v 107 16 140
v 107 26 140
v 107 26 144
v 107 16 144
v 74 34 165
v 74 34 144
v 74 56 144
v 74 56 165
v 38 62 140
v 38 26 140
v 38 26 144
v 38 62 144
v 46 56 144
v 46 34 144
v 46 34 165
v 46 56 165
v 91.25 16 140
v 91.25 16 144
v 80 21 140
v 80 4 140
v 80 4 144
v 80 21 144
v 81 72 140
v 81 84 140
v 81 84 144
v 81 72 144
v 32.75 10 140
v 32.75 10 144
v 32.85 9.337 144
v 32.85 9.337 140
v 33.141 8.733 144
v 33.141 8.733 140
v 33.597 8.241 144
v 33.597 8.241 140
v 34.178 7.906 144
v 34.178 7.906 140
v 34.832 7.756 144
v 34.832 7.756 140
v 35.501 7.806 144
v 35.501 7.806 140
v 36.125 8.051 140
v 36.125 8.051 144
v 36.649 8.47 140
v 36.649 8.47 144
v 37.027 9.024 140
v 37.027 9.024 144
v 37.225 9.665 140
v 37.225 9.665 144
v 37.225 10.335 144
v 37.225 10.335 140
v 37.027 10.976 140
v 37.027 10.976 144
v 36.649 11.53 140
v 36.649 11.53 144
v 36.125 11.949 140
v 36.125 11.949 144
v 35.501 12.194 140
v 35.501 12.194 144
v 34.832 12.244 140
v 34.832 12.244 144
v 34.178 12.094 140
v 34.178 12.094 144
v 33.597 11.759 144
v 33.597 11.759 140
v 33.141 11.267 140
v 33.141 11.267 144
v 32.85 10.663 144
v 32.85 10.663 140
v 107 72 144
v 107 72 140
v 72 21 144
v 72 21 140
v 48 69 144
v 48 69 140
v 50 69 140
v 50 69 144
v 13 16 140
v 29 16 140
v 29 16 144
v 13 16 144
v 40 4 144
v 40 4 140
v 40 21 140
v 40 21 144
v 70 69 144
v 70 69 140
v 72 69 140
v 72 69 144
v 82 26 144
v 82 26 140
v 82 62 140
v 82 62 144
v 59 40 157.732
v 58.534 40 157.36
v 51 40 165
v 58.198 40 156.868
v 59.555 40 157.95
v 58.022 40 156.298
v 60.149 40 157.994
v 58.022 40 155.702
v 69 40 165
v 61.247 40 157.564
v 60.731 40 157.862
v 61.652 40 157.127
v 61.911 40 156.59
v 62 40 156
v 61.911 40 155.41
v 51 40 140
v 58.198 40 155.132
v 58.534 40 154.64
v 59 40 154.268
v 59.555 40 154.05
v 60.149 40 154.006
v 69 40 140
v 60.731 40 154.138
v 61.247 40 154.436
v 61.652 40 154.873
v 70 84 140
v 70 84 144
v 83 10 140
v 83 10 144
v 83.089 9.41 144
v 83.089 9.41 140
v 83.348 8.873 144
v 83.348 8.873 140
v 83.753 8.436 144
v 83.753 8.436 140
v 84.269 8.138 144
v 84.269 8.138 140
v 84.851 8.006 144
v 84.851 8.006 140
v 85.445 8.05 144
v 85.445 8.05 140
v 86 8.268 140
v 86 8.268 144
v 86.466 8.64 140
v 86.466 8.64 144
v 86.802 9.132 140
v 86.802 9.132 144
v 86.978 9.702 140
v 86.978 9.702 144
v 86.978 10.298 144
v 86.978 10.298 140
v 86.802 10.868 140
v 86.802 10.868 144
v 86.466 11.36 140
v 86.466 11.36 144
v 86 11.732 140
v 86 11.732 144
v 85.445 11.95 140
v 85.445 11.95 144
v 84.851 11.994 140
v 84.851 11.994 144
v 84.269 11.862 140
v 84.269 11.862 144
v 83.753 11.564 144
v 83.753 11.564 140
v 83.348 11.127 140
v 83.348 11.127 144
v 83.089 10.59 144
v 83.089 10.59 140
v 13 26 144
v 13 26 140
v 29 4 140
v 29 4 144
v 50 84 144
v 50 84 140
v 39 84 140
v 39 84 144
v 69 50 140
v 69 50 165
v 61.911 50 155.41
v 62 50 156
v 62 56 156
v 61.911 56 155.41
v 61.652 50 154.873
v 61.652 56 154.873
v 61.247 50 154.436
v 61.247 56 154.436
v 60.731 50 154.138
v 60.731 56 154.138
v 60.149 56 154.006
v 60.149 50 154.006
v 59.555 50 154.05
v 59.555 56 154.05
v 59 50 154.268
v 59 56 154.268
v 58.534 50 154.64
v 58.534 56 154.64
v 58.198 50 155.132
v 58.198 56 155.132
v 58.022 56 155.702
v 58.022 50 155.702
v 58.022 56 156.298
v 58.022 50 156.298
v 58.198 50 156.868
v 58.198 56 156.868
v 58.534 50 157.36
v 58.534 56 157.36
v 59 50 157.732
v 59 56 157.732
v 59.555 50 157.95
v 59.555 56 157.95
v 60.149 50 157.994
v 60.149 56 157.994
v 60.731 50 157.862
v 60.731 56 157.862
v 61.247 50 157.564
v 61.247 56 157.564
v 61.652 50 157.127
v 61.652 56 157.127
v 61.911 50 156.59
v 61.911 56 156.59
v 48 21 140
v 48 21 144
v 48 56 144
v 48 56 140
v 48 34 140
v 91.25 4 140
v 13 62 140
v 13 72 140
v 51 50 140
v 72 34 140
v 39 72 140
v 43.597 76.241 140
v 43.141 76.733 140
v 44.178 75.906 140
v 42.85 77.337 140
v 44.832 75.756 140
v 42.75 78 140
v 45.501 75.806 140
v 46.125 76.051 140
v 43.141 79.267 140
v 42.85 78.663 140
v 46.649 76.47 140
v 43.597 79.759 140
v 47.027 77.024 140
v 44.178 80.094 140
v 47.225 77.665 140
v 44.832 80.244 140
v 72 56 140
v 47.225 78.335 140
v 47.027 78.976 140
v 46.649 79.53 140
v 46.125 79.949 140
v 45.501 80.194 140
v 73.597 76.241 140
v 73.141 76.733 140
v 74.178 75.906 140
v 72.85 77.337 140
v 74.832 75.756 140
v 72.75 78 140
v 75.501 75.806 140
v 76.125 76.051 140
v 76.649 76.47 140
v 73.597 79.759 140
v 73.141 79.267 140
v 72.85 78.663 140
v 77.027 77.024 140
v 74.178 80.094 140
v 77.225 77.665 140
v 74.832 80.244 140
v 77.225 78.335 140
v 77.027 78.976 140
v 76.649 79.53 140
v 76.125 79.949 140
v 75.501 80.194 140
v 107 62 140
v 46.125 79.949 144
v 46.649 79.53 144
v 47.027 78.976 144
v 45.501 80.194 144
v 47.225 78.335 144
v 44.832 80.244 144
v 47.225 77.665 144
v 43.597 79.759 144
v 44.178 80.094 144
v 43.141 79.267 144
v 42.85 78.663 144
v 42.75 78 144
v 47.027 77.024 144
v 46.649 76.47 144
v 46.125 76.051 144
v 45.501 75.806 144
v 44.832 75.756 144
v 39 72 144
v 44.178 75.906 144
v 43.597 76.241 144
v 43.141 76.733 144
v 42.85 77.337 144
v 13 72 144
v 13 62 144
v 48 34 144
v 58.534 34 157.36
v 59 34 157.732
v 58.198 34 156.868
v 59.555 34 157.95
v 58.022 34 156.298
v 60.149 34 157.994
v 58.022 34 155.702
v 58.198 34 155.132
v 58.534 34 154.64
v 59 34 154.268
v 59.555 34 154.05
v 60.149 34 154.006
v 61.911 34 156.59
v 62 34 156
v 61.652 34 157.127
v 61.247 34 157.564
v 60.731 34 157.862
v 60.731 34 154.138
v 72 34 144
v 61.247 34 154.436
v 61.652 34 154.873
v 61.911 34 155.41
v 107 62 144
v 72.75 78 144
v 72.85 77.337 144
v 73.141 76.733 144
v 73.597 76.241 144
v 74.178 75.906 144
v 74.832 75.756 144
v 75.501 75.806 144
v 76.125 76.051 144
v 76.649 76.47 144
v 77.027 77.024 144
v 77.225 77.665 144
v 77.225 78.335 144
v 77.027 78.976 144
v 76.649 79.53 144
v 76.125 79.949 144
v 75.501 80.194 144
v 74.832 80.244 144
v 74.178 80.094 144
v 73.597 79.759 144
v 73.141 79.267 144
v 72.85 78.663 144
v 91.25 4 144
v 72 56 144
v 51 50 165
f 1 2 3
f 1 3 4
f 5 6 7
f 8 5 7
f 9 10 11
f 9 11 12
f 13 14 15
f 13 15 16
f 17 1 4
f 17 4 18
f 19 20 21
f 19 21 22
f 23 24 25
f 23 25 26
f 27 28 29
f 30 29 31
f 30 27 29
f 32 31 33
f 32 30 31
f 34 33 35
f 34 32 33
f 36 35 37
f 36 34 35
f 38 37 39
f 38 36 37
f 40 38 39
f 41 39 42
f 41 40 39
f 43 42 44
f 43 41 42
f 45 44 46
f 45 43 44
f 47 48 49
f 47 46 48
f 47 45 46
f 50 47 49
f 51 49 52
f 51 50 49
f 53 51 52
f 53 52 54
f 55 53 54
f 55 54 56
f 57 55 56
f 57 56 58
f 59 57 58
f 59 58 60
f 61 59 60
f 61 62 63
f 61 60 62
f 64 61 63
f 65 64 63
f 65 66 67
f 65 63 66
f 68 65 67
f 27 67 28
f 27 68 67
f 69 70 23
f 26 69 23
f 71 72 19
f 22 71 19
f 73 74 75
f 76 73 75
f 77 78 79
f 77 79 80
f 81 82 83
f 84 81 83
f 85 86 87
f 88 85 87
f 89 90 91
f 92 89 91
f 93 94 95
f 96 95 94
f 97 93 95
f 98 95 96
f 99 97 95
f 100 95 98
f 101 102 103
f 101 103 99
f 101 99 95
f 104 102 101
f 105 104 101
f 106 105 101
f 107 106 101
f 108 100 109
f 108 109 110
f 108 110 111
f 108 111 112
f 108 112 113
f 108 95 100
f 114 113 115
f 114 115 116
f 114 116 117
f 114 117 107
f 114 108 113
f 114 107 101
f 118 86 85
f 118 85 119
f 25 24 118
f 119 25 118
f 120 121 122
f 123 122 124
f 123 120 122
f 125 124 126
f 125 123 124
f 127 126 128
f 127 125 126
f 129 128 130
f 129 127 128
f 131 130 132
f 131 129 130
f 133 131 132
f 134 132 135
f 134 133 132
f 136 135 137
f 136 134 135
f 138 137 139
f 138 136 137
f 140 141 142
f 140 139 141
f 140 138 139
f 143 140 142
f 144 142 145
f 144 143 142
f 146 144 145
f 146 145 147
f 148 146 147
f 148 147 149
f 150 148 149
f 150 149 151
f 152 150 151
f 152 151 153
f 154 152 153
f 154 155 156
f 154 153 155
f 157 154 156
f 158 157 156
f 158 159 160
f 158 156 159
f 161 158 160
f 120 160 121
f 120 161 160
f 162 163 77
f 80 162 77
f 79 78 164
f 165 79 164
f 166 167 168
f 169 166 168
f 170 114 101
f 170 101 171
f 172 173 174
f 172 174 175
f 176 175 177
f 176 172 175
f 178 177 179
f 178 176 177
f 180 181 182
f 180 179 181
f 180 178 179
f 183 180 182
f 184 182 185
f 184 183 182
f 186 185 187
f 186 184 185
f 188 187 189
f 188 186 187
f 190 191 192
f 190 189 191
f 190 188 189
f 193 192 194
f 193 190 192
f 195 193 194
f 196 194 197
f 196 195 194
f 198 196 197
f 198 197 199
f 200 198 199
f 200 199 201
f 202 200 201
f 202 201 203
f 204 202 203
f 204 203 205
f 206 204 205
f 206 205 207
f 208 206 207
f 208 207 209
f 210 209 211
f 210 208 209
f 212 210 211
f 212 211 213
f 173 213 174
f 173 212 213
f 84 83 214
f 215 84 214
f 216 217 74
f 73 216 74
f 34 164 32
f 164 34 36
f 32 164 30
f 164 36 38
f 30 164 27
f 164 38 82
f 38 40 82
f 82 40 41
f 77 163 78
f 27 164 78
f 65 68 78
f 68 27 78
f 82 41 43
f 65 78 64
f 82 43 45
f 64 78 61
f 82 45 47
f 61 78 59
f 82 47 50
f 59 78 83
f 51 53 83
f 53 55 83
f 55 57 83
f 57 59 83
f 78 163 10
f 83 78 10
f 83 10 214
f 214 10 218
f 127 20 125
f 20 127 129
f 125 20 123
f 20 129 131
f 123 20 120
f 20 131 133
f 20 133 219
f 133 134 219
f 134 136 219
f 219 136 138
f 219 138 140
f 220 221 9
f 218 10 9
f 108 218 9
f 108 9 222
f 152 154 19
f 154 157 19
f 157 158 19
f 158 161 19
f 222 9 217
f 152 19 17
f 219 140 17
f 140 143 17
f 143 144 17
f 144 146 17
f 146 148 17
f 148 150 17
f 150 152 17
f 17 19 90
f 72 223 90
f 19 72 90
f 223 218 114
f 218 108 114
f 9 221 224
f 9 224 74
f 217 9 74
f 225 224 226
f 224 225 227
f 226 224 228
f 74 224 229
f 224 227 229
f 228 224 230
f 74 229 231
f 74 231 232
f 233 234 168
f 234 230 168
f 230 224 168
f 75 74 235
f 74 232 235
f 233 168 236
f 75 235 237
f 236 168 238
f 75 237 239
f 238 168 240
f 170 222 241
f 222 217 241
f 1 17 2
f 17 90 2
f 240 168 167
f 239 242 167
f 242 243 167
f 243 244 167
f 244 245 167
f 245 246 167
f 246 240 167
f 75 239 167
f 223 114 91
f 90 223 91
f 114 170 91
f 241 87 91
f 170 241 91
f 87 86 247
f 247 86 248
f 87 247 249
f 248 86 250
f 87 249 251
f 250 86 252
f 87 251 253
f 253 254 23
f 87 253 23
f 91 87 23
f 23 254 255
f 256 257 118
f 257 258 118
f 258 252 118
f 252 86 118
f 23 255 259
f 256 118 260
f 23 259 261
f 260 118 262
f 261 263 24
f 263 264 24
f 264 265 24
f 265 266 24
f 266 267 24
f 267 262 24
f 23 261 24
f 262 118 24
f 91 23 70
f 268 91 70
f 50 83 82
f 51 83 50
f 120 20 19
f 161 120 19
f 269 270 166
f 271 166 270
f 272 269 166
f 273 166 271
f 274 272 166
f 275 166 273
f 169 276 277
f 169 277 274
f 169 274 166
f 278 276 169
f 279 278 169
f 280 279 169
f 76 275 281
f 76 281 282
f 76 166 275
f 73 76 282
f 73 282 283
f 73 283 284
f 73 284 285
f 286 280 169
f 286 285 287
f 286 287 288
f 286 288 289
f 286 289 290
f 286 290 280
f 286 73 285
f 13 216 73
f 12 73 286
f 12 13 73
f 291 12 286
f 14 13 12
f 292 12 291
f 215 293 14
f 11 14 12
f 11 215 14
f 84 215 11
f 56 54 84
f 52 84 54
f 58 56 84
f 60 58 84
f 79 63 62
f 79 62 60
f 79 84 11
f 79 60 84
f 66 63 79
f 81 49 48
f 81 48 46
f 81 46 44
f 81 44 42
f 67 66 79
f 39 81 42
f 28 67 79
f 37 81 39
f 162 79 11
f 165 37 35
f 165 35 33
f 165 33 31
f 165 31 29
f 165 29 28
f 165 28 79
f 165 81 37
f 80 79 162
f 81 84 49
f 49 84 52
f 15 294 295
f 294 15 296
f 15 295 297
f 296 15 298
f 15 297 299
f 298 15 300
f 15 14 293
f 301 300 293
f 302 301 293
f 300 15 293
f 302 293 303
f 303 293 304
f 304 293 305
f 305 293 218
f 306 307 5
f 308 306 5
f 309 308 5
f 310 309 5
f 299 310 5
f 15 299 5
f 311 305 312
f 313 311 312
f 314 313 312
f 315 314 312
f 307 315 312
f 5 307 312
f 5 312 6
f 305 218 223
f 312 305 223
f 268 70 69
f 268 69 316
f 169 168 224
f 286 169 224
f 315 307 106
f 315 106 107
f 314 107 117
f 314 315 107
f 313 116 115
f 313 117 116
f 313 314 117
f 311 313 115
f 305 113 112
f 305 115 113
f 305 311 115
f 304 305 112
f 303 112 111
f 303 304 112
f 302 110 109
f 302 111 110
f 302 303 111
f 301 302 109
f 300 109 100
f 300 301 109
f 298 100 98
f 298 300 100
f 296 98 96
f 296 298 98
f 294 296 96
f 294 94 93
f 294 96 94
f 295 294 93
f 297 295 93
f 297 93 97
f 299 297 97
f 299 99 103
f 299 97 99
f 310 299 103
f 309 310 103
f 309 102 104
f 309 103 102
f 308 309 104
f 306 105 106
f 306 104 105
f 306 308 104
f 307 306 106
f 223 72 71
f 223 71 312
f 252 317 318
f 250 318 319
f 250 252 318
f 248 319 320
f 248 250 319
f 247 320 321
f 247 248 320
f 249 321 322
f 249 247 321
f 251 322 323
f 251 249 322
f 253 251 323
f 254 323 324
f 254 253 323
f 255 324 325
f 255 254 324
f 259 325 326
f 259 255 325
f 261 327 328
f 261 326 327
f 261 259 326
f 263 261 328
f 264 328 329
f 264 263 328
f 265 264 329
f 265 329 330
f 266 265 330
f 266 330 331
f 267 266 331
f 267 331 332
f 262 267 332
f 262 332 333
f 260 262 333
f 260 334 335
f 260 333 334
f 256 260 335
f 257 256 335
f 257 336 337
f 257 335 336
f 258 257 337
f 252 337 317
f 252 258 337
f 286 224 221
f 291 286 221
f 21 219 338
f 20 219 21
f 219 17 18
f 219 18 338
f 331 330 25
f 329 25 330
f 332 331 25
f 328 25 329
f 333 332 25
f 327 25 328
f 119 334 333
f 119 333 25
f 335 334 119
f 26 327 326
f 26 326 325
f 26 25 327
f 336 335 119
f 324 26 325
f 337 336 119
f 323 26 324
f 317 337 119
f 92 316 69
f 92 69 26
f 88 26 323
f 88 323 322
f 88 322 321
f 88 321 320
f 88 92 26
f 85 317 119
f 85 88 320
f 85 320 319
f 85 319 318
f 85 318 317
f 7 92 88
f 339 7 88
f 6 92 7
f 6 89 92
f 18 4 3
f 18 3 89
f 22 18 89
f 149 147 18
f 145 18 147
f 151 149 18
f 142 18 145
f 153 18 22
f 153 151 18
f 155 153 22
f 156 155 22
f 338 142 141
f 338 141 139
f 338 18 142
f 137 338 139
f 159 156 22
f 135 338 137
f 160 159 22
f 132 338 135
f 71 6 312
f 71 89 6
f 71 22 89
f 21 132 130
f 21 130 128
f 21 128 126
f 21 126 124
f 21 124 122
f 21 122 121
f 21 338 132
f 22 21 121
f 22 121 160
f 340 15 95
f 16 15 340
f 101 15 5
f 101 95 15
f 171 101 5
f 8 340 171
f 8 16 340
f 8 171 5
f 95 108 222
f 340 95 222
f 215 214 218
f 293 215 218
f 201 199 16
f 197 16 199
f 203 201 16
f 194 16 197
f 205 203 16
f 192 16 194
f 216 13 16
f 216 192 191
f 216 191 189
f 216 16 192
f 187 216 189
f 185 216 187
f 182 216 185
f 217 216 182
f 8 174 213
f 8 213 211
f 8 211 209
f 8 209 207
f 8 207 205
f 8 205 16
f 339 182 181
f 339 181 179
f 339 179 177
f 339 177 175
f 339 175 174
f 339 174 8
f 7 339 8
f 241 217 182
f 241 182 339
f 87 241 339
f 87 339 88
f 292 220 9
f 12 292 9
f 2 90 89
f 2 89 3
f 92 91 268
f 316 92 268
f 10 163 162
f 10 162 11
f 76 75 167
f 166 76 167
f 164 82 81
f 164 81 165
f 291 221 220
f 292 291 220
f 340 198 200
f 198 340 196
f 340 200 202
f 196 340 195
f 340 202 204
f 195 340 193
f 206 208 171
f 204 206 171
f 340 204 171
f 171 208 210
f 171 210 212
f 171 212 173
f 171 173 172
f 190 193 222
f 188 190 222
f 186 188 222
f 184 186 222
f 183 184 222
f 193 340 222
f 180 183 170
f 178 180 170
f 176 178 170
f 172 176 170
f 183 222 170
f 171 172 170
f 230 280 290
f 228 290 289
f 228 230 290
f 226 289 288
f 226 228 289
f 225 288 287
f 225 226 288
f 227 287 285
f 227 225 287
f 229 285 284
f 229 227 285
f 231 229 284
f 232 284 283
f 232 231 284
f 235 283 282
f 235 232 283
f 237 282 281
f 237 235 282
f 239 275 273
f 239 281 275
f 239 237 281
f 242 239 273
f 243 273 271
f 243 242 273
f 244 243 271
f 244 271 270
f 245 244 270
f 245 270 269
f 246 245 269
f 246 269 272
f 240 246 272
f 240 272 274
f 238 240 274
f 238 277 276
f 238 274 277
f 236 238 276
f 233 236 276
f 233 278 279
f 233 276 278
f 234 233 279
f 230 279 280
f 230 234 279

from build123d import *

# Parameters (mm, degrees)
CYLINDER_R             = 2
CYLINDER_DEPTH         = 50
BOX083_W               = 24
BOX083_H               = 13
BOX083_DEPTH           = 10
BOX082_W               = 40
BOX082_H               = 17
BOX082_DEPTH           = 10
BOX081_W               = 25
BOX081_H               = 36
BOX081_DEPTH           = 10
BOX084_W               = 24
BOX084_H               = 13
BOX084_DEPTH           = 10
BOX080_W               = 25
BOX080_H               = 36
BOX080_DEPTH           = 10
BOX085_W               = 15
BOX085_H               = 20
BOX085_DEPTH           = 10
BOX073_W               = 18
BOX073_H               = 10
BOX073_DEPTH           = 25
BOX086_W               = 28
BOX086_H               = 22
BOX086_DEPTH           = 25
CYLINDER107_R          = 1
CYLINDER107_DEPTH      = 10
CYLINDER103_R          = 2.25
CYLINDER103_DEPTH      = 10
CYLINDER104_R          = 2.25
CYLINDER104_DEPTH      = 10
CYLINDER106_R          = 2
CYLINDER106_DEPTH      = 10
CYLINDER105_R          = 2.25
CYLINDER105_DEPTH      = 10
BOX063_W               = 26
BOX063_H               = 12
BOX063_DEPTH           = 4
BOX061_W               = 26
BOX061_H               = 12
BOX061_DEPTH           = 4
BOX062_W               = 26
BOX062_H               = 12
BOX062_DEPTH           = 4
BOX064_W               = 26
BOX064_H               = 12
BOX064_DEPTH           = 4
BOX060_W               = 94
BOX060_H               = 80
BOX060_DEPTH           = 4
CUT020_PLACEMENT_ANGLE = 180


with BuildPart() as cylinder:
    # Cylinder → Cylinder (new body)
    with BuildSketch(Plane(origin=(60, 17, 156), x_dir=(1, 0, 0), z_dir=(0, 1, 0))):
        Circle(CYLINDER_R)
    extrude(amount=CYLINDER_DEPTH)


with BuildPart() as cube041:
    # Box083 → Box083 (new body)
    with BuildSketch(Plane(origin=(48, 21, 140), x_dir=(1, 0, 0), z_dir=(0, 0, 1))):
        with Locations((12, 6.5)):
            Rectangle(BOX083_W, BOX083_H)
    extrude(amount=BOX083_DEPTH)


with BuildPart() as cube040:
    # Box082 → Box082 (new body)
    with BuildSketch(Plane(origin=(40, 4, 140), x_dir=(1, 0, 0), z_dir=(0, 0, 1))):
        with Locations((20, 8.5)):
            Rectangle(BOX082_W, BOX082_H)
    extrude(amount=BOX082_DEPTH)


with BuildPart() as cube039:
    # Box081 → Box081 (new body)
    with BuildSketch(Plane(origin=(82, 26, 140), x_dir=(1, 0, 0), z_dir=(0, 0, 1))):
        with Locations((12.5, 18)):
            Rectangle(BOX081_W, BOX081_H)
    extrude(amount=BOX081_DEPTH)


with BuildPart() as cube042:
    # Box084 → Box084 (new body)
    with BuildSketch(Plane(origin=(48, 56, 140), x_dir=(1, 0, 0), z_dir=(0, 0, 1))):
        with Locations((12, 6.5)):
            Rectangle(BOX084_W, BOX084_H)
    extrude(amount=BOX084_DEPTH)


with BuildPart() as cube038:
    # Box080 → Box080 (new body)
    with BuildSketch(Plane(origin=(13, 26, 140), x_dir=(1, 0, 0), z_dir=(0, 0, 1))):
        with Locations((12.5, 18)):
            Rectangle(BOX080_W, BOX080_H)
    extrude(amount=BOX080_DEPTH)


with BuildPart() as basecuts:
    # Box085 → Box085 (new body)
    with BuildSketch(Plane(origin=(70, 69, 140), x_dir=(0, 1, 0), z_dir=(0, 0, 1))):
        with Locations((7.5, 10)):
            Rectangle(BOX085_W, BOX085_H)
    extrude(amount=BOX085_DEPTH)

    # Fusion133: union Cube041, Cube040, Cube039, Cube042, Cube038
    add(cube041.part)
    add(cube040.part)
    add(cube039.part)
    add(cube042.part)
    add(cube038.part)


with BuildPart() as basecuts001:
    # Box073 → Box073 (new body)
    with BuildSketch(Plane(origin=(51, 40, 140), x_dir=(1, 0, 0), z_dir=(0, 0, 1))):
        with Locations((9, 5)):
            Rectangle(BOX073_W, BOX073_H)
    extrude(amount=BOX073_DEPTH)

    # Fusion134: union baseCuts
    add(basecuts.part)


with BuildPart() as basespinein:
    # Box086 → Box086 (new body)
    with BuildSketch(Plane(origin=(46, 34, 140), x_dir=(1, 0, 0), z_dir=(0, 0, 1))):
        with Locations((14, 11)):
            Rectangle(BOX086_W, BOX086_H)
    extrude(amount=BOX086_DEPTH)


with BuildPart() as cylinder109:
    # Cylinder107 → Cylinder107 (new body)
    with BuildSketch(Plane.XY):
        Circle(CYLINDER107_R)
    extrude(amount=CYLINDER107_DEPTH)


with BuildPart() as cylinder107:
    # Cylinder103 → Cylinder103 (new body)
    with BuildSketch(Plane(origin=(62, 3, 0), x_dir=(1, 0, 0), z_dir=(0, 0, 1))):
        Circle(CYLINDER103_R)
    extrude(amount=CYLINDER103_DEPTH)


with BuildPart() as cylinder103:
    # Cylinder104 → Cylinder104 (new body)
    with BuildSketch(Plane(origin=(72, 71, 0), x_dir=(1, 0, 0), z_dir=(0, 0, 1))):
        Circle(CYLINDER104_R)
    extrude(amount=CYLINDER104_DEPTH)


with BuildPart() as cylinder104:
    # Cylinder106 → Cylinder106 (new body)
    with BuildSketch(Plane(origin=(22, 71, 0), x_dir=(1, 0, 0), z_dir=(0, 0, 1))):
        Circle(CYLINDER106_R)
    extrude(amount=CYLINDER106_DEPTH)


with BuildPart() as screwins001:
    # Cylinder105 → Cylinder105 (new body)
    with BuildSketch(Plane(origin=(32, 3, 0), x_dir=(1, 0, 0), z_dir=(0, 0, 1))):
        Circle(CYLINDER105_R)
    extrude(amount=CYLINDER105_DEPTH)

    # Fusion123: union Cylinder109, Cylinder107, Cylinder103, Cylinder104
    add(cylinder109.part)
    add(cylinder107.part)
    add(cylinder103.part)
    add(cylinder104.part)


with BuildPart() as screwins001_1:
    # Fusion123 placement: moved
    add(screwins001.part.moved(Location((0, 3, 0))))


with BuildPart() as base004:
    # Box063 → Box063 (new body)
    with BuildSketch(Plane(origin=(78, 68, 0), x_dir=(1, 0, 0), z_dir=(0, 0, 1))):
        with Locations((13, 6)):
            Rectangle(BOX063_W, BOX063_H)
    extrude(amount=BOX063_DEPTH)


with BuildPart() as base002:
    # Box061 → Box061 (new body)
    with BuildSketch(Plane.XY):
        with Locations((13, 6)):
            Rectangle(BOX061_W, BOX061_H)
    extrude(amount=BOX061_DEPTH)


with BuildPart() as base003:
    # Box062 → Box062 (new body)
    with BuildSketch(Plane(origin=(68, 0, 0), x_dir=(1, 0, 0), z_dir=(0, 0, 1))):
        with Locations((13, 6)):
            Rectangle(BOX062_W, BOX062_H)
    extrude(amount=BOX062_DEPTH)


with BuildPart() as fusion122:
    # Box064 → Box064 (new body)
    with BuildSketch(Plane(origin=(-10.25, 68, 0), x_dir=(1, 0, 0), z_dir=(0, 0, 1))):
        with Locations((13, 6)):
            Rectangle(BOX064_W, BOX064_H)
    extrude(amount=BOX064_DEPTH)

    # Fusion122: union base004, base002, base003
    add(base004.part)
    add(base002.part)
    add(base003.part)


with BuildPart() as spine:
    # Box060 → Box060 (new body)
    with BuildSketch(Plane.XY):
        with Locations((47, 40)):
            Rectangle(BOX060_W, BOX060_H)
    extrude(amount=BOX060_DEPTH)

    # Cut019: cut Fusion122
    add(fusion122.part, mode=Mode.SUBTRACT)

    # Cut020: cut screwIns001
    add(screwins001_1.part, mode=Mode.SUBTRACT)


with BuildPart() as spine_1:
    # Cut020 placement: moved
    add(spine.part.moved(Location((107, 84, 140))).rotate(Axis((107, 84, 140), (0, 0, 1)), CUT020_PLACEMENT_ANGLE))

    # Fusion: union baseSpineIn
    add(basespinein.part)

    # Cut: cut baseCuts001
    add(basecuts001.part, mode=Mode.SUBTRACT)

    # Cut021: cut Cylinder
    add(cylinder.part, mode=Mode.SUBTRACT)


solid = spine_1.part
